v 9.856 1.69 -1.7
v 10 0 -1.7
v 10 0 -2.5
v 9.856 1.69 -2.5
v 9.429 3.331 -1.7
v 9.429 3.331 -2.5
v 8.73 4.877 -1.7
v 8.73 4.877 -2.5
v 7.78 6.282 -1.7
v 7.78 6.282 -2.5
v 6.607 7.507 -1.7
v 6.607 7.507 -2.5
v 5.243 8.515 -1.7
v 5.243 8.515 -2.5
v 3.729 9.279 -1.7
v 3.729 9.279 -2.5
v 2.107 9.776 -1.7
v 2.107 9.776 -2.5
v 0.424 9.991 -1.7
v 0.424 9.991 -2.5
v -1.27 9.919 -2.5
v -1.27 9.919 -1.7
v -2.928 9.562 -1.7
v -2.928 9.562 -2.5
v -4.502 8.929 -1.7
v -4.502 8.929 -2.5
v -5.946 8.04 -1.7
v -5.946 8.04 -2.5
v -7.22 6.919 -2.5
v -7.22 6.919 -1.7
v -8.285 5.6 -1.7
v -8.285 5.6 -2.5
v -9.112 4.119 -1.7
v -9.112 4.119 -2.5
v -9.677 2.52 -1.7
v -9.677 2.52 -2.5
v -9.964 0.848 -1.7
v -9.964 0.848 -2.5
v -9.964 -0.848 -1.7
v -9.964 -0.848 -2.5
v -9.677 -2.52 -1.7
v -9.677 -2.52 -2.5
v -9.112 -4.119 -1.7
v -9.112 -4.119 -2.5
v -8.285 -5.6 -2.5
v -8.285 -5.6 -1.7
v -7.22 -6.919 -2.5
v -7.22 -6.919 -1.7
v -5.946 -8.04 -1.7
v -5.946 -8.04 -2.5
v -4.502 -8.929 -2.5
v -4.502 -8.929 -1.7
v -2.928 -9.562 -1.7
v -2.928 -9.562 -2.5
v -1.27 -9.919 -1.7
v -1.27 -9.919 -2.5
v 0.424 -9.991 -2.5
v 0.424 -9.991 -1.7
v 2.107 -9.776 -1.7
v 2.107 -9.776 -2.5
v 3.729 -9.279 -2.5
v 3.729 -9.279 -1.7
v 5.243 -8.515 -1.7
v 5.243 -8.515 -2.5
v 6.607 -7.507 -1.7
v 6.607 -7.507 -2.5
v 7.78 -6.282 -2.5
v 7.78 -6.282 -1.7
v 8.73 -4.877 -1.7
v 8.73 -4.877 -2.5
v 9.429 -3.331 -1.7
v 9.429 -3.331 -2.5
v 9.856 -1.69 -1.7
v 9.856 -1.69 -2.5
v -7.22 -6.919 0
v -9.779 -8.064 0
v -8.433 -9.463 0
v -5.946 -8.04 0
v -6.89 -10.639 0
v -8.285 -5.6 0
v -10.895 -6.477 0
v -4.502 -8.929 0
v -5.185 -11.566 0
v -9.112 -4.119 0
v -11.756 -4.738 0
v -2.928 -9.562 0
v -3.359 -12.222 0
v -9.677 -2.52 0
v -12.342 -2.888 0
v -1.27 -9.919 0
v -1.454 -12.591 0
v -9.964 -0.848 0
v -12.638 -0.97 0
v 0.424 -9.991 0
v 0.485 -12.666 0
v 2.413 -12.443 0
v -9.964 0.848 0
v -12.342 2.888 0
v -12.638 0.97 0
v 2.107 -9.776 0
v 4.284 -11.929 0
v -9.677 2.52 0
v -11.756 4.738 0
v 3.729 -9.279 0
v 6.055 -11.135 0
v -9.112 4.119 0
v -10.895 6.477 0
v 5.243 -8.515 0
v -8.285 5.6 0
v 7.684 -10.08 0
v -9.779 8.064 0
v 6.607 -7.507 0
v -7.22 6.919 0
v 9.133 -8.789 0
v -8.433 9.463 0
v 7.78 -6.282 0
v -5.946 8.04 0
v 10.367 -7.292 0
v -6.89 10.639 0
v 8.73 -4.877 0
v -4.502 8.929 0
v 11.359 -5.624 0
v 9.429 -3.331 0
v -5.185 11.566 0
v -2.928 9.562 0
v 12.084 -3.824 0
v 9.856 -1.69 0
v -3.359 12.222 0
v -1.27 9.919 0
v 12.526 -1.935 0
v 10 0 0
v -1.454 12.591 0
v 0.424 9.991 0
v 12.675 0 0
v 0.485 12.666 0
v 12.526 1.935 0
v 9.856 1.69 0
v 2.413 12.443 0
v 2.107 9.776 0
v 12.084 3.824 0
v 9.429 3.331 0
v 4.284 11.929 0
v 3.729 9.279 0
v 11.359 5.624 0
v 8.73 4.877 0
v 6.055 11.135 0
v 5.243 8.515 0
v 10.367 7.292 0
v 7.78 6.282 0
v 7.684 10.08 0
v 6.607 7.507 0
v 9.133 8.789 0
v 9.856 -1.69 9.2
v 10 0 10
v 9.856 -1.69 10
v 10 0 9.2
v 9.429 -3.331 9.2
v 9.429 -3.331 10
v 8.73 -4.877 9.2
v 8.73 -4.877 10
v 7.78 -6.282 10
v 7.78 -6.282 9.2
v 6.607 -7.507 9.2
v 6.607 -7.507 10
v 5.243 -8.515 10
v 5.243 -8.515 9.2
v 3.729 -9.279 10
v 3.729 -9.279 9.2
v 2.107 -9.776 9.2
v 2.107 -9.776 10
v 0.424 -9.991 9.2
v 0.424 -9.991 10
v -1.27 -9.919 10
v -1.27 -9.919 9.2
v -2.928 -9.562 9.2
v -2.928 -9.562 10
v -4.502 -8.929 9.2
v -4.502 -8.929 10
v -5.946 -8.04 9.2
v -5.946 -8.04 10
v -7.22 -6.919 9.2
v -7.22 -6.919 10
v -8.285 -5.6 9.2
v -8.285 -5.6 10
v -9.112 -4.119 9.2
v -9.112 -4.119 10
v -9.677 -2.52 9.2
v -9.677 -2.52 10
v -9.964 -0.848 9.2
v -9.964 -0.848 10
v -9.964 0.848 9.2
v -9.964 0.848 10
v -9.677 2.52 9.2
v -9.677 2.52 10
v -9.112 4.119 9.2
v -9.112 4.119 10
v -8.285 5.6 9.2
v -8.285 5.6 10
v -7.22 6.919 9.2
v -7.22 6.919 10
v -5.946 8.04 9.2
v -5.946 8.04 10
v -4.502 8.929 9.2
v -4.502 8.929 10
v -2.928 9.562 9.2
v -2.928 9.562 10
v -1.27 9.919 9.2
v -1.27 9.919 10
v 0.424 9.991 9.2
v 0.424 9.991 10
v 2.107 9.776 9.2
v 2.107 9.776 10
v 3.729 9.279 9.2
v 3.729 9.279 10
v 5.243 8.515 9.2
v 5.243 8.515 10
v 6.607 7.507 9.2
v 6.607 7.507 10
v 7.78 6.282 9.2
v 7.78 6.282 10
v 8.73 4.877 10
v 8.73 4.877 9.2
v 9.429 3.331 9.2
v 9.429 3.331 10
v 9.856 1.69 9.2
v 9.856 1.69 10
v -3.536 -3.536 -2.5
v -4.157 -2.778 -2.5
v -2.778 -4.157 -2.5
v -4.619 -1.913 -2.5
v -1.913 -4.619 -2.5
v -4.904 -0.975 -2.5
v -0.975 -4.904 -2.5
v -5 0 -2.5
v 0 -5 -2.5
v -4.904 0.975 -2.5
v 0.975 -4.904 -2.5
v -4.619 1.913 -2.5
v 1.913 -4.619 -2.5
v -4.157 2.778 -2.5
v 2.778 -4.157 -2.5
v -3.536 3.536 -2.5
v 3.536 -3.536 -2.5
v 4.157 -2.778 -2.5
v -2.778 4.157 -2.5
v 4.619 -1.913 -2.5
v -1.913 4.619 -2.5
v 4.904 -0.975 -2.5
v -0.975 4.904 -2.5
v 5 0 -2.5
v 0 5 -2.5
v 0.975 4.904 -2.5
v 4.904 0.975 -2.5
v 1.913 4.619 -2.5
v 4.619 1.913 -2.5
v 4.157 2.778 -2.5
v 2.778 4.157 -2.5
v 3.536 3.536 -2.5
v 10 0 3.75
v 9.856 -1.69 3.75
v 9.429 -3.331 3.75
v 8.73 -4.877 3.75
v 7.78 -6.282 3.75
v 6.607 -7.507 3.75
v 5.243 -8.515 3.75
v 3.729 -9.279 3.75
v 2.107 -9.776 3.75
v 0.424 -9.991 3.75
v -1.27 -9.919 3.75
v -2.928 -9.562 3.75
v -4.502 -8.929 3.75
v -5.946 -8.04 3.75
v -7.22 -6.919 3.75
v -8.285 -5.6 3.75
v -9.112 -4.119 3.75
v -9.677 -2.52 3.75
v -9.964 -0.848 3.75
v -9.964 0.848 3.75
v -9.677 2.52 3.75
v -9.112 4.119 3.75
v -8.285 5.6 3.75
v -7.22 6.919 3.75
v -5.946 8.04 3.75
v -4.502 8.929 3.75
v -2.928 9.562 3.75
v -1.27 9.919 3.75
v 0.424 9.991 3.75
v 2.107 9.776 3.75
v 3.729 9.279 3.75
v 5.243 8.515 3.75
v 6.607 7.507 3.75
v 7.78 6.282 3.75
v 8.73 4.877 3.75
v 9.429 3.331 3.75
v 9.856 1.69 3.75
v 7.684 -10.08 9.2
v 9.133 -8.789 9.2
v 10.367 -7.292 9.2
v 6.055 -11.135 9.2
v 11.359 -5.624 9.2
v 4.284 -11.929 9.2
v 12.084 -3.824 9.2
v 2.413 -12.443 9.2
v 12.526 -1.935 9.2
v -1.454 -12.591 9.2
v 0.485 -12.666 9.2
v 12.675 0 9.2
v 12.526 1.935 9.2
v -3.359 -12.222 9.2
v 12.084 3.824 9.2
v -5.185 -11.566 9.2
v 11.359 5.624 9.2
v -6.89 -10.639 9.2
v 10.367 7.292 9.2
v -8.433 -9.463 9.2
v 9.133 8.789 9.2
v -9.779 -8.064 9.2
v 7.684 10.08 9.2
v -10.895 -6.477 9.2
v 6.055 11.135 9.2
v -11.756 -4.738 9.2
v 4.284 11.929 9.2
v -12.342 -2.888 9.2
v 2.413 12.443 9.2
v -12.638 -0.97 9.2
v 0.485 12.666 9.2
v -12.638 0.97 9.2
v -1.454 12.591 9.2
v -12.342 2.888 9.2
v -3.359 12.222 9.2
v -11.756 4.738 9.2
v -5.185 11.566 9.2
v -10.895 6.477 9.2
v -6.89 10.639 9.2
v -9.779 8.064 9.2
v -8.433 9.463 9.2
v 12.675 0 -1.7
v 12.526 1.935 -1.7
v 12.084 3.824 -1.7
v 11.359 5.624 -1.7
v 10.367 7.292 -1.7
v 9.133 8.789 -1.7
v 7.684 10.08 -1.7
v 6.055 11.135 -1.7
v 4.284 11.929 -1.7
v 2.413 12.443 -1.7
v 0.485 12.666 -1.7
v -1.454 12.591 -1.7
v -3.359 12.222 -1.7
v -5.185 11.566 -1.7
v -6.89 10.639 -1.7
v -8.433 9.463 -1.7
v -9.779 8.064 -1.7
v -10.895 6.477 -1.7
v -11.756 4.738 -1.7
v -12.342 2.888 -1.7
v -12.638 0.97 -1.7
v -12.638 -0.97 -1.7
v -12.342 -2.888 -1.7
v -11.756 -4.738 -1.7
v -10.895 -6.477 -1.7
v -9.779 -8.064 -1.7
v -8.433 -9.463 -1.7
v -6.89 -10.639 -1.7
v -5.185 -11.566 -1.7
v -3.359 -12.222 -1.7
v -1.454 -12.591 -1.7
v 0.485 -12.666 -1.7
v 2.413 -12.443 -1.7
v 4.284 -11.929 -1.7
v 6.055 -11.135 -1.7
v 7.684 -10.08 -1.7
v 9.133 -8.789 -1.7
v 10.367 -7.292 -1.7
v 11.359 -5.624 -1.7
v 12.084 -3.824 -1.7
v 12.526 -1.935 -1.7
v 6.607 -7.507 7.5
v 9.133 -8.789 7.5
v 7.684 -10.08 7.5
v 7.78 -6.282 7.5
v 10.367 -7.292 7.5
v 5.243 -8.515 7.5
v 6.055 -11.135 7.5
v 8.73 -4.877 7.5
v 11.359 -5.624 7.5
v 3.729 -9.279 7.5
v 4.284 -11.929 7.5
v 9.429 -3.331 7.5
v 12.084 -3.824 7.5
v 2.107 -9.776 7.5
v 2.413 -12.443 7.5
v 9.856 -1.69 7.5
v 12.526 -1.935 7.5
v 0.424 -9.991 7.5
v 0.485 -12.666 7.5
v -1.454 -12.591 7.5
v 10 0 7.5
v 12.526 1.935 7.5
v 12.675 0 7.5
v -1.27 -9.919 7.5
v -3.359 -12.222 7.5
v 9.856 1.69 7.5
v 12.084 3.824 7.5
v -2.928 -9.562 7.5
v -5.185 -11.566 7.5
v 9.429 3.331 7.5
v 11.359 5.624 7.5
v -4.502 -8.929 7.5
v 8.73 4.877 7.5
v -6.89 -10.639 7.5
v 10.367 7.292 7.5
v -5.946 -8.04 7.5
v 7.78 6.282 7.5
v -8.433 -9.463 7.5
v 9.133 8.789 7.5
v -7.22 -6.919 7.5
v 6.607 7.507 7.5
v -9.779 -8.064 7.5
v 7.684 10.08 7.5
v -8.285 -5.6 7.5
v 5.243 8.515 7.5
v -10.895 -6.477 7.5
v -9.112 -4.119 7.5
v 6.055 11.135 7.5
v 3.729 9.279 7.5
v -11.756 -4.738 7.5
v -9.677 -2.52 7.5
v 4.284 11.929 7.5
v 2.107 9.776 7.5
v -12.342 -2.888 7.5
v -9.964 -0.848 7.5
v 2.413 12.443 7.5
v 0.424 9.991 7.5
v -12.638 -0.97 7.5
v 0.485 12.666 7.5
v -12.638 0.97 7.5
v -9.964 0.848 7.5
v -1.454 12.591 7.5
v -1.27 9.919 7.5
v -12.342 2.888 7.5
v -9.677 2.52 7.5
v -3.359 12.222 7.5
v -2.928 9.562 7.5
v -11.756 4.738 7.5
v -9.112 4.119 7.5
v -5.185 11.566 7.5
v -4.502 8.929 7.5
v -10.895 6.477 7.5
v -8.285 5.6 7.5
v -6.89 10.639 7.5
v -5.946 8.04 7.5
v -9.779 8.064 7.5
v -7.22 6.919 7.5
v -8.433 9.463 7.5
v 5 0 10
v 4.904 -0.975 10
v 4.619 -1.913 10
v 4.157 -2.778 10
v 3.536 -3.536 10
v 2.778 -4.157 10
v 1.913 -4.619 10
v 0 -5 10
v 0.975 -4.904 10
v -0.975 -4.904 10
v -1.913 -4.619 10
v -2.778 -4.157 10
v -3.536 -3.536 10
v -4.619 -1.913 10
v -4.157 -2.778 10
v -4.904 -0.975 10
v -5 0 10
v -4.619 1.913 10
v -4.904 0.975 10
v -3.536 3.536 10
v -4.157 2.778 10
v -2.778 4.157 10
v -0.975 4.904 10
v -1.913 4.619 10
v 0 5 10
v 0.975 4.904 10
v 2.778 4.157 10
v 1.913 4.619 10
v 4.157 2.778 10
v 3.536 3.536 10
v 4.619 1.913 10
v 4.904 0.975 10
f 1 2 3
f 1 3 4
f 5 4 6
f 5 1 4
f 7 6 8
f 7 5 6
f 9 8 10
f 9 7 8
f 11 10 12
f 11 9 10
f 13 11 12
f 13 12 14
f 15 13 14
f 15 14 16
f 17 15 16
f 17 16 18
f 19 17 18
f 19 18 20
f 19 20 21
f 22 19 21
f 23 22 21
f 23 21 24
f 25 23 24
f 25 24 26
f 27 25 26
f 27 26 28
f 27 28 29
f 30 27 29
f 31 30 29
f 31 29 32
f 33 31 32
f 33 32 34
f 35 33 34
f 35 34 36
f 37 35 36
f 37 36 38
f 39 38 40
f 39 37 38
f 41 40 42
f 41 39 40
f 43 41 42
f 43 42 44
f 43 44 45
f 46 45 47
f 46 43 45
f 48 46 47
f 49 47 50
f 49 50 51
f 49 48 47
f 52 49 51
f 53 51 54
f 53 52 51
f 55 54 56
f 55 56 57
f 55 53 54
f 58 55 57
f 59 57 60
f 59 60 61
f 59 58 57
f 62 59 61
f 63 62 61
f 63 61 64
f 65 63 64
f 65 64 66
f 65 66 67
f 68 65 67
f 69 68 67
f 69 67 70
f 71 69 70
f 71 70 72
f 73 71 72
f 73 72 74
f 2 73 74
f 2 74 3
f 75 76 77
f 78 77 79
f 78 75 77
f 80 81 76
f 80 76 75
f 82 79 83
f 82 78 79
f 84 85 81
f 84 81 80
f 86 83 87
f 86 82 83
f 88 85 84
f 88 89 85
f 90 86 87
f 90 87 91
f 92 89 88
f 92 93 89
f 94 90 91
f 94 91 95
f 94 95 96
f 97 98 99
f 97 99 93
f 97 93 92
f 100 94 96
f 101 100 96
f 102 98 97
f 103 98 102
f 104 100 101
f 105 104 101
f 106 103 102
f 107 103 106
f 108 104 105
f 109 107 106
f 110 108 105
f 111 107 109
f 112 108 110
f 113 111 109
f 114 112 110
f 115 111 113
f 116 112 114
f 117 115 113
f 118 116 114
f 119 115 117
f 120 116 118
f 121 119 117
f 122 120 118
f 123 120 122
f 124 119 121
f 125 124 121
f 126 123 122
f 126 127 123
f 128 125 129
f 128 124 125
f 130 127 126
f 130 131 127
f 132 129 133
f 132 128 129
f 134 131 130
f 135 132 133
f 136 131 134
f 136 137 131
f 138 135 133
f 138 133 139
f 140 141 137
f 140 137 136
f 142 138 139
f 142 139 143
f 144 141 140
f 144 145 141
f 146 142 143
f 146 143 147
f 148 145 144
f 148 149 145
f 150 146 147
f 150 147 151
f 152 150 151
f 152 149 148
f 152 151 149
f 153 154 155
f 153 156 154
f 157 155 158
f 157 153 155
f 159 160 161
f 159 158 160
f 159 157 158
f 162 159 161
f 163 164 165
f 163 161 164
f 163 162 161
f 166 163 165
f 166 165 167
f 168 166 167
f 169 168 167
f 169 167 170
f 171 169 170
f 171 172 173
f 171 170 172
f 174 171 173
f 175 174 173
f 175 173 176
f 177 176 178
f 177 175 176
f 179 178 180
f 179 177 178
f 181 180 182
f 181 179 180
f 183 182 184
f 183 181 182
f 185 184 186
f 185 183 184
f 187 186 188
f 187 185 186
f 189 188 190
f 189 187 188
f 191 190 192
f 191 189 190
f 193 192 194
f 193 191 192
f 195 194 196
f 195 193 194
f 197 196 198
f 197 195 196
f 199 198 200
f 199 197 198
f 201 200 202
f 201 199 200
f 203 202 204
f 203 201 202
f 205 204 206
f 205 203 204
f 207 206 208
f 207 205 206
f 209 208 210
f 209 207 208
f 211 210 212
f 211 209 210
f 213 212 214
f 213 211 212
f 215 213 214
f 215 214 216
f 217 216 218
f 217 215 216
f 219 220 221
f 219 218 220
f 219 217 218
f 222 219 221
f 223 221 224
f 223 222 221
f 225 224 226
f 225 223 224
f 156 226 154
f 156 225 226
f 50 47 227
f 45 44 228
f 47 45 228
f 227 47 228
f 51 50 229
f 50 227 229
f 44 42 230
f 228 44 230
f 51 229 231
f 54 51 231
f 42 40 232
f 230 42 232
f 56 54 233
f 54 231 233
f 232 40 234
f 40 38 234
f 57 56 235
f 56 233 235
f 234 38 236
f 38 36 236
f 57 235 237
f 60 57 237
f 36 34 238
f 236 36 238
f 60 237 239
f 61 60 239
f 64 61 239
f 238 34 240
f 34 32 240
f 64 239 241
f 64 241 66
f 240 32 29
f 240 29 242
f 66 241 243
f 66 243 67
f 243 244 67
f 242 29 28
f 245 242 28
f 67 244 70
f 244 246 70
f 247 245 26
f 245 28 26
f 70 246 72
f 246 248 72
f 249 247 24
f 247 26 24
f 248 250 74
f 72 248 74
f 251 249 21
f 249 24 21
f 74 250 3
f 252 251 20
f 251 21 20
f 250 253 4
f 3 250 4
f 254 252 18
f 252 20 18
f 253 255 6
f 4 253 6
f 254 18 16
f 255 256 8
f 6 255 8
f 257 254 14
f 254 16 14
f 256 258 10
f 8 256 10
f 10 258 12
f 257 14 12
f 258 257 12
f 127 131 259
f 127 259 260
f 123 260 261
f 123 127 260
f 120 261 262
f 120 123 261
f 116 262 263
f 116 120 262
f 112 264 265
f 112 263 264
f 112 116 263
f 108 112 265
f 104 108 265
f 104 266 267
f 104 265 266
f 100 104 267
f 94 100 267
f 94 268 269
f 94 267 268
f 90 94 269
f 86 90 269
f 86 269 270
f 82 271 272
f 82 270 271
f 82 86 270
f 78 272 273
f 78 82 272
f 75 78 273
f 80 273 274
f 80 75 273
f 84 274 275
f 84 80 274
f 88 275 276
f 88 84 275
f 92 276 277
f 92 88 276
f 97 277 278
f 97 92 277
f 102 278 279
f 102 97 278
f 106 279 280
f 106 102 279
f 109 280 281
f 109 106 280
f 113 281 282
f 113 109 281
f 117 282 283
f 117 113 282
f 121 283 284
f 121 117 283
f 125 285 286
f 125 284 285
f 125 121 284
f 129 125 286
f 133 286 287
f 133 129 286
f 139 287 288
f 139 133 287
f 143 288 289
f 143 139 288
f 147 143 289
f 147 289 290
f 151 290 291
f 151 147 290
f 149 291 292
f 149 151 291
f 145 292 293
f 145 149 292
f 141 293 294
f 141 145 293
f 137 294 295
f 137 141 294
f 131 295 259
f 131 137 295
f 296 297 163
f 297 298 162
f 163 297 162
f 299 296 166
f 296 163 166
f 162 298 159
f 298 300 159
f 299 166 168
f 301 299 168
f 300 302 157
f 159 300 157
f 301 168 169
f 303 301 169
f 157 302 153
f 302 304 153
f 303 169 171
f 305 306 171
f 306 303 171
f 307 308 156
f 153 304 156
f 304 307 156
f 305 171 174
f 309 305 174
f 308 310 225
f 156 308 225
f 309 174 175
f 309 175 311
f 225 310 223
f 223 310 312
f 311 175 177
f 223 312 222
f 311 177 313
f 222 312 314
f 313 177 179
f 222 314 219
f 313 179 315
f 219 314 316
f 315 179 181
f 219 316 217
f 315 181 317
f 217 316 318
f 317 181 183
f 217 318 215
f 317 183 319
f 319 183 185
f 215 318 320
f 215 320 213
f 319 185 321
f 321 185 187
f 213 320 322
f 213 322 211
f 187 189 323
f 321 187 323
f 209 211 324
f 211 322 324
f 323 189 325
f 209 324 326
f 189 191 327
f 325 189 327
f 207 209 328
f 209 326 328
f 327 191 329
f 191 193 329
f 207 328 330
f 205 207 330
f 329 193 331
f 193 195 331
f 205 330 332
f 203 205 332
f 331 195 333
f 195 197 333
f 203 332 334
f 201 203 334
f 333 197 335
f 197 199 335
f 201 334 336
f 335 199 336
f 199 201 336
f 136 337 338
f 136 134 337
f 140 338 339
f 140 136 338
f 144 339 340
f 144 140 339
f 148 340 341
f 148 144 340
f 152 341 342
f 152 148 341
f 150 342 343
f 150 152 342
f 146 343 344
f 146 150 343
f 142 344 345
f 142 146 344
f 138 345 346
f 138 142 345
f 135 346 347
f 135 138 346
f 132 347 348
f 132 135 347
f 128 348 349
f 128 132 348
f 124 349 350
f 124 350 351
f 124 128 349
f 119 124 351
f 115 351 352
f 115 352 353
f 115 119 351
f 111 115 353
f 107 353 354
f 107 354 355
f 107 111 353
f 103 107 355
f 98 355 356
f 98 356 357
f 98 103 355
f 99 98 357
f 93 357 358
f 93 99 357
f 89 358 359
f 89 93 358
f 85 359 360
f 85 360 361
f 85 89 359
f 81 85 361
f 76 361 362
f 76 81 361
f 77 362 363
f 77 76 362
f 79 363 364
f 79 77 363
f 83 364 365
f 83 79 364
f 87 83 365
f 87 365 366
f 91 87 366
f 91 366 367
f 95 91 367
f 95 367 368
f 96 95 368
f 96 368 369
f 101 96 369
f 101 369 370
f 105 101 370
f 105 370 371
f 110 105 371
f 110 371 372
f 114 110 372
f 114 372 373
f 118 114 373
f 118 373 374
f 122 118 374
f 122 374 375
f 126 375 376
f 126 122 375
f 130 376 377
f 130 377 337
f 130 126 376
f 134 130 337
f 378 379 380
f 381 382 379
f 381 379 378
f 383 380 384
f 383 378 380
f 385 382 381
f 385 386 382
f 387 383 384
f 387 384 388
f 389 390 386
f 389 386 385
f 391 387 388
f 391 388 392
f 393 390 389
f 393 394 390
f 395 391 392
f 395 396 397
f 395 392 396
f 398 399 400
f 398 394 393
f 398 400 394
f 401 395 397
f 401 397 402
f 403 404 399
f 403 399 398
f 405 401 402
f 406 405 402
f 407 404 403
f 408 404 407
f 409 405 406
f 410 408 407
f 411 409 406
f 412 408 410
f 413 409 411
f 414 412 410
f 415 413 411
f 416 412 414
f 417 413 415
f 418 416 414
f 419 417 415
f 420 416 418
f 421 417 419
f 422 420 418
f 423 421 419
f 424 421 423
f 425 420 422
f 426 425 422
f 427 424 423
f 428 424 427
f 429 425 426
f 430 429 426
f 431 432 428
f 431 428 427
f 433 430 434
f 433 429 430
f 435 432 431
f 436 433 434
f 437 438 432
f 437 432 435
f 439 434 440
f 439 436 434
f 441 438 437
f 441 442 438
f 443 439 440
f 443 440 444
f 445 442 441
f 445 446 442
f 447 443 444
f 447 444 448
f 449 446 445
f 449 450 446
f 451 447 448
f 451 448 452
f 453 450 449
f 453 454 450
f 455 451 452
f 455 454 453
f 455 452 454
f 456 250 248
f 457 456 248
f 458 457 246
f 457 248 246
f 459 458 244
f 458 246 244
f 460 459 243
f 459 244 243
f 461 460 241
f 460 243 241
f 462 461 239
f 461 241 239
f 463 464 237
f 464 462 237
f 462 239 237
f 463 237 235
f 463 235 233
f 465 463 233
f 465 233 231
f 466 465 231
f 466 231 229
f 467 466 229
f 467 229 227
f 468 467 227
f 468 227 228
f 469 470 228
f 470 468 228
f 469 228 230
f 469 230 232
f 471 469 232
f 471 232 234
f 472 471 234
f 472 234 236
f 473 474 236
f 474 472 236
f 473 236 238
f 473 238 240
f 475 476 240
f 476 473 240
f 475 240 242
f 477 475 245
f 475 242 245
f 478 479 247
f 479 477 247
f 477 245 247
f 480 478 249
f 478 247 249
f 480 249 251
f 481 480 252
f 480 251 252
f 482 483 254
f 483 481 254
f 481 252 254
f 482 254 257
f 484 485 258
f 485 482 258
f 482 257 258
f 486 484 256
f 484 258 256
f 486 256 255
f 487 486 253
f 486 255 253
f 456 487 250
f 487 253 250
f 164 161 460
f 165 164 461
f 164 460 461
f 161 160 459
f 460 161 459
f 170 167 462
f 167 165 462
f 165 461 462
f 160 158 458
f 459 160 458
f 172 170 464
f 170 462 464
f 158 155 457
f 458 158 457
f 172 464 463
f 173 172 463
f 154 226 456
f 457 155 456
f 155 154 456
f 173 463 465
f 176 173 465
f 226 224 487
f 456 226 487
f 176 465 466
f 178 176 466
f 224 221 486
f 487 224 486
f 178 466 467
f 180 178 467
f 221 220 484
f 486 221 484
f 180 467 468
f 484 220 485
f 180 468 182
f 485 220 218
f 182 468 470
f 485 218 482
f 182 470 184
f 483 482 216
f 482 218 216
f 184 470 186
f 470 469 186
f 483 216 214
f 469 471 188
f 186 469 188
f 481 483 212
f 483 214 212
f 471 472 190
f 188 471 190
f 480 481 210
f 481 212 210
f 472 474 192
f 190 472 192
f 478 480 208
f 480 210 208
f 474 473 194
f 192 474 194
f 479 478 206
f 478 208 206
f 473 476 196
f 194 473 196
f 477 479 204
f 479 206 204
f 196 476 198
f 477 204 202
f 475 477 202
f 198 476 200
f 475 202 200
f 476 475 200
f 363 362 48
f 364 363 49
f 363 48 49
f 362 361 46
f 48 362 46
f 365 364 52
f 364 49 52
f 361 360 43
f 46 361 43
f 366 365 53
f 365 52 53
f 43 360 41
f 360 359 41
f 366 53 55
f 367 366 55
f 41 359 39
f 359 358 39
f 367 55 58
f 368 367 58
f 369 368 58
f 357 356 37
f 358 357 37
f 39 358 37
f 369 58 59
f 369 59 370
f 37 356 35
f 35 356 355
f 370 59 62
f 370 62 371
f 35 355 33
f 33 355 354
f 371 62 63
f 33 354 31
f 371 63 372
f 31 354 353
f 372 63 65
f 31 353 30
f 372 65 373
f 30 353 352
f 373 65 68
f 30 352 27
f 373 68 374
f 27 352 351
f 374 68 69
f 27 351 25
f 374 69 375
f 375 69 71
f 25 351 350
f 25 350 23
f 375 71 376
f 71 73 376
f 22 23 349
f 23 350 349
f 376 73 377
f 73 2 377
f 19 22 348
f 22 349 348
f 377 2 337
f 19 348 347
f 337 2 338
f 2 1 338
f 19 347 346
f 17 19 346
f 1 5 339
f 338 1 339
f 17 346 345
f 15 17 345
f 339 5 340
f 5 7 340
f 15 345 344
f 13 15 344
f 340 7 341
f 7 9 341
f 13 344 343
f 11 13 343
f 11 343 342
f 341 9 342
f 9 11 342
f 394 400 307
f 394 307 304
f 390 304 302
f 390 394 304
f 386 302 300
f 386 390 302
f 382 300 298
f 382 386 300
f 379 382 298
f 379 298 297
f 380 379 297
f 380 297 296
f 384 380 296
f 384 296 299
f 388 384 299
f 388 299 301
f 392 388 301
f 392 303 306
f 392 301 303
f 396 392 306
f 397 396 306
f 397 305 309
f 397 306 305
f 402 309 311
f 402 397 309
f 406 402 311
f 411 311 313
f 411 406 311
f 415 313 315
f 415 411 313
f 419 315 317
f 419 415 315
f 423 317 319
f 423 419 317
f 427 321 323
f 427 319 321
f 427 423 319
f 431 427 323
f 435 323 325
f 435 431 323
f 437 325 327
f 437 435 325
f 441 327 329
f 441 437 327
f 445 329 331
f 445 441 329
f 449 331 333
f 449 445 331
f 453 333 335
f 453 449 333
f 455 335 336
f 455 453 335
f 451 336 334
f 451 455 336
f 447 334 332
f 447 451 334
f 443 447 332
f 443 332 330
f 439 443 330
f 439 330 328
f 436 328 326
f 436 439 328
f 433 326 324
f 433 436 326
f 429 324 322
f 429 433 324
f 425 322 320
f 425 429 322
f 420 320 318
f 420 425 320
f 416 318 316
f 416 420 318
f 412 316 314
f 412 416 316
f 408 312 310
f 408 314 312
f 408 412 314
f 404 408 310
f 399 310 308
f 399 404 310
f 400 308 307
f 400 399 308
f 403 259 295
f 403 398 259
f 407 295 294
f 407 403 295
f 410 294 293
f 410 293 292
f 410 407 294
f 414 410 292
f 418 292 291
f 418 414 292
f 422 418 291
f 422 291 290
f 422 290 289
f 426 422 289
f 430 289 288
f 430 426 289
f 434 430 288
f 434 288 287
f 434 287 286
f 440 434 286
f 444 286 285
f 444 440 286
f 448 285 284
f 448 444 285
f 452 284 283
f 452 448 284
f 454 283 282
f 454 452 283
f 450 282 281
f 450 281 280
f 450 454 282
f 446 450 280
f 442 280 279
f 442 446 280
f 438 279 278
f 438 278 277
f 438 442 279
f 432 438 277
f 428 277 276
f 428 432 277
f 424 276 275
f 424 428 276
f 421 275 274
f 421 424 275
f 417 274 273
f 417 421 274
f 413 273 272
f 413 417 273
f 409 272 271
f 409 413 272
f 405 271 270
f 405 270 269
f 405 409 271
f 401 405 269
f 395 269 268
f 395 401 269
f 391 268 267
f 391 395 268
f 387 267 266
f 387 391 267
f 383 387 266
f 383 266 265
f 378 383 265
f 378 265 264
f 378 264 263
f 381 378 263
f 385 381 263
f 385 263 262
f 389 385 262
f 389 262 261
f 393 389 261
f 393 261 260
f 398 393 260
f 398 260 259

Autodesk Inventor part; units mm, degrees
ref_plane "YZ Plane" through (0, 0, 0) normal (1, 0, 0) x (0, 1, 0)
ref_plane "XZ Plane" through (0, 0, 0) normal (0, 1, 0) x (-1, 0, 0)
sketch "スケッチ1" plane through (0, 0, 0) normal (0, 0, 1) x (1, 0, 0)
  circle A0 centre (0, 0) radius 12.675
  circle A1 centre (0, 0) radius 5
  circle A2 centre (0, 0) radius 10
  circle A3 centre (0, 0) radius 16
  dimension "d0" = 25.35
  dimension "d1" = 10
  dimension "d2" = 20
  dimension "d3" = 32
extrude "押し出し1" add sketch "スケッチ1" along normal blind 3.75 contours A2
extrude "押し出し2" add sketch "スケッチ1" against normal blind 1.7 contours A0
extrude "押し出し3" add sketch "スケッチ1" against normal blind 2.5 contours A2
mirror "ミラー1" about plane through (0, 0, 3.75) normal (0, 0, 1) of "押し出し1", "押し出し2", "押し出し3"
ref_plane "作業平面1" through (0, 0, 3.75) normal (0, 0, 1) x (1, 0, 0)
properties part number "timing _pulley_7.5" material "アルミニウム 6061-AHC"
